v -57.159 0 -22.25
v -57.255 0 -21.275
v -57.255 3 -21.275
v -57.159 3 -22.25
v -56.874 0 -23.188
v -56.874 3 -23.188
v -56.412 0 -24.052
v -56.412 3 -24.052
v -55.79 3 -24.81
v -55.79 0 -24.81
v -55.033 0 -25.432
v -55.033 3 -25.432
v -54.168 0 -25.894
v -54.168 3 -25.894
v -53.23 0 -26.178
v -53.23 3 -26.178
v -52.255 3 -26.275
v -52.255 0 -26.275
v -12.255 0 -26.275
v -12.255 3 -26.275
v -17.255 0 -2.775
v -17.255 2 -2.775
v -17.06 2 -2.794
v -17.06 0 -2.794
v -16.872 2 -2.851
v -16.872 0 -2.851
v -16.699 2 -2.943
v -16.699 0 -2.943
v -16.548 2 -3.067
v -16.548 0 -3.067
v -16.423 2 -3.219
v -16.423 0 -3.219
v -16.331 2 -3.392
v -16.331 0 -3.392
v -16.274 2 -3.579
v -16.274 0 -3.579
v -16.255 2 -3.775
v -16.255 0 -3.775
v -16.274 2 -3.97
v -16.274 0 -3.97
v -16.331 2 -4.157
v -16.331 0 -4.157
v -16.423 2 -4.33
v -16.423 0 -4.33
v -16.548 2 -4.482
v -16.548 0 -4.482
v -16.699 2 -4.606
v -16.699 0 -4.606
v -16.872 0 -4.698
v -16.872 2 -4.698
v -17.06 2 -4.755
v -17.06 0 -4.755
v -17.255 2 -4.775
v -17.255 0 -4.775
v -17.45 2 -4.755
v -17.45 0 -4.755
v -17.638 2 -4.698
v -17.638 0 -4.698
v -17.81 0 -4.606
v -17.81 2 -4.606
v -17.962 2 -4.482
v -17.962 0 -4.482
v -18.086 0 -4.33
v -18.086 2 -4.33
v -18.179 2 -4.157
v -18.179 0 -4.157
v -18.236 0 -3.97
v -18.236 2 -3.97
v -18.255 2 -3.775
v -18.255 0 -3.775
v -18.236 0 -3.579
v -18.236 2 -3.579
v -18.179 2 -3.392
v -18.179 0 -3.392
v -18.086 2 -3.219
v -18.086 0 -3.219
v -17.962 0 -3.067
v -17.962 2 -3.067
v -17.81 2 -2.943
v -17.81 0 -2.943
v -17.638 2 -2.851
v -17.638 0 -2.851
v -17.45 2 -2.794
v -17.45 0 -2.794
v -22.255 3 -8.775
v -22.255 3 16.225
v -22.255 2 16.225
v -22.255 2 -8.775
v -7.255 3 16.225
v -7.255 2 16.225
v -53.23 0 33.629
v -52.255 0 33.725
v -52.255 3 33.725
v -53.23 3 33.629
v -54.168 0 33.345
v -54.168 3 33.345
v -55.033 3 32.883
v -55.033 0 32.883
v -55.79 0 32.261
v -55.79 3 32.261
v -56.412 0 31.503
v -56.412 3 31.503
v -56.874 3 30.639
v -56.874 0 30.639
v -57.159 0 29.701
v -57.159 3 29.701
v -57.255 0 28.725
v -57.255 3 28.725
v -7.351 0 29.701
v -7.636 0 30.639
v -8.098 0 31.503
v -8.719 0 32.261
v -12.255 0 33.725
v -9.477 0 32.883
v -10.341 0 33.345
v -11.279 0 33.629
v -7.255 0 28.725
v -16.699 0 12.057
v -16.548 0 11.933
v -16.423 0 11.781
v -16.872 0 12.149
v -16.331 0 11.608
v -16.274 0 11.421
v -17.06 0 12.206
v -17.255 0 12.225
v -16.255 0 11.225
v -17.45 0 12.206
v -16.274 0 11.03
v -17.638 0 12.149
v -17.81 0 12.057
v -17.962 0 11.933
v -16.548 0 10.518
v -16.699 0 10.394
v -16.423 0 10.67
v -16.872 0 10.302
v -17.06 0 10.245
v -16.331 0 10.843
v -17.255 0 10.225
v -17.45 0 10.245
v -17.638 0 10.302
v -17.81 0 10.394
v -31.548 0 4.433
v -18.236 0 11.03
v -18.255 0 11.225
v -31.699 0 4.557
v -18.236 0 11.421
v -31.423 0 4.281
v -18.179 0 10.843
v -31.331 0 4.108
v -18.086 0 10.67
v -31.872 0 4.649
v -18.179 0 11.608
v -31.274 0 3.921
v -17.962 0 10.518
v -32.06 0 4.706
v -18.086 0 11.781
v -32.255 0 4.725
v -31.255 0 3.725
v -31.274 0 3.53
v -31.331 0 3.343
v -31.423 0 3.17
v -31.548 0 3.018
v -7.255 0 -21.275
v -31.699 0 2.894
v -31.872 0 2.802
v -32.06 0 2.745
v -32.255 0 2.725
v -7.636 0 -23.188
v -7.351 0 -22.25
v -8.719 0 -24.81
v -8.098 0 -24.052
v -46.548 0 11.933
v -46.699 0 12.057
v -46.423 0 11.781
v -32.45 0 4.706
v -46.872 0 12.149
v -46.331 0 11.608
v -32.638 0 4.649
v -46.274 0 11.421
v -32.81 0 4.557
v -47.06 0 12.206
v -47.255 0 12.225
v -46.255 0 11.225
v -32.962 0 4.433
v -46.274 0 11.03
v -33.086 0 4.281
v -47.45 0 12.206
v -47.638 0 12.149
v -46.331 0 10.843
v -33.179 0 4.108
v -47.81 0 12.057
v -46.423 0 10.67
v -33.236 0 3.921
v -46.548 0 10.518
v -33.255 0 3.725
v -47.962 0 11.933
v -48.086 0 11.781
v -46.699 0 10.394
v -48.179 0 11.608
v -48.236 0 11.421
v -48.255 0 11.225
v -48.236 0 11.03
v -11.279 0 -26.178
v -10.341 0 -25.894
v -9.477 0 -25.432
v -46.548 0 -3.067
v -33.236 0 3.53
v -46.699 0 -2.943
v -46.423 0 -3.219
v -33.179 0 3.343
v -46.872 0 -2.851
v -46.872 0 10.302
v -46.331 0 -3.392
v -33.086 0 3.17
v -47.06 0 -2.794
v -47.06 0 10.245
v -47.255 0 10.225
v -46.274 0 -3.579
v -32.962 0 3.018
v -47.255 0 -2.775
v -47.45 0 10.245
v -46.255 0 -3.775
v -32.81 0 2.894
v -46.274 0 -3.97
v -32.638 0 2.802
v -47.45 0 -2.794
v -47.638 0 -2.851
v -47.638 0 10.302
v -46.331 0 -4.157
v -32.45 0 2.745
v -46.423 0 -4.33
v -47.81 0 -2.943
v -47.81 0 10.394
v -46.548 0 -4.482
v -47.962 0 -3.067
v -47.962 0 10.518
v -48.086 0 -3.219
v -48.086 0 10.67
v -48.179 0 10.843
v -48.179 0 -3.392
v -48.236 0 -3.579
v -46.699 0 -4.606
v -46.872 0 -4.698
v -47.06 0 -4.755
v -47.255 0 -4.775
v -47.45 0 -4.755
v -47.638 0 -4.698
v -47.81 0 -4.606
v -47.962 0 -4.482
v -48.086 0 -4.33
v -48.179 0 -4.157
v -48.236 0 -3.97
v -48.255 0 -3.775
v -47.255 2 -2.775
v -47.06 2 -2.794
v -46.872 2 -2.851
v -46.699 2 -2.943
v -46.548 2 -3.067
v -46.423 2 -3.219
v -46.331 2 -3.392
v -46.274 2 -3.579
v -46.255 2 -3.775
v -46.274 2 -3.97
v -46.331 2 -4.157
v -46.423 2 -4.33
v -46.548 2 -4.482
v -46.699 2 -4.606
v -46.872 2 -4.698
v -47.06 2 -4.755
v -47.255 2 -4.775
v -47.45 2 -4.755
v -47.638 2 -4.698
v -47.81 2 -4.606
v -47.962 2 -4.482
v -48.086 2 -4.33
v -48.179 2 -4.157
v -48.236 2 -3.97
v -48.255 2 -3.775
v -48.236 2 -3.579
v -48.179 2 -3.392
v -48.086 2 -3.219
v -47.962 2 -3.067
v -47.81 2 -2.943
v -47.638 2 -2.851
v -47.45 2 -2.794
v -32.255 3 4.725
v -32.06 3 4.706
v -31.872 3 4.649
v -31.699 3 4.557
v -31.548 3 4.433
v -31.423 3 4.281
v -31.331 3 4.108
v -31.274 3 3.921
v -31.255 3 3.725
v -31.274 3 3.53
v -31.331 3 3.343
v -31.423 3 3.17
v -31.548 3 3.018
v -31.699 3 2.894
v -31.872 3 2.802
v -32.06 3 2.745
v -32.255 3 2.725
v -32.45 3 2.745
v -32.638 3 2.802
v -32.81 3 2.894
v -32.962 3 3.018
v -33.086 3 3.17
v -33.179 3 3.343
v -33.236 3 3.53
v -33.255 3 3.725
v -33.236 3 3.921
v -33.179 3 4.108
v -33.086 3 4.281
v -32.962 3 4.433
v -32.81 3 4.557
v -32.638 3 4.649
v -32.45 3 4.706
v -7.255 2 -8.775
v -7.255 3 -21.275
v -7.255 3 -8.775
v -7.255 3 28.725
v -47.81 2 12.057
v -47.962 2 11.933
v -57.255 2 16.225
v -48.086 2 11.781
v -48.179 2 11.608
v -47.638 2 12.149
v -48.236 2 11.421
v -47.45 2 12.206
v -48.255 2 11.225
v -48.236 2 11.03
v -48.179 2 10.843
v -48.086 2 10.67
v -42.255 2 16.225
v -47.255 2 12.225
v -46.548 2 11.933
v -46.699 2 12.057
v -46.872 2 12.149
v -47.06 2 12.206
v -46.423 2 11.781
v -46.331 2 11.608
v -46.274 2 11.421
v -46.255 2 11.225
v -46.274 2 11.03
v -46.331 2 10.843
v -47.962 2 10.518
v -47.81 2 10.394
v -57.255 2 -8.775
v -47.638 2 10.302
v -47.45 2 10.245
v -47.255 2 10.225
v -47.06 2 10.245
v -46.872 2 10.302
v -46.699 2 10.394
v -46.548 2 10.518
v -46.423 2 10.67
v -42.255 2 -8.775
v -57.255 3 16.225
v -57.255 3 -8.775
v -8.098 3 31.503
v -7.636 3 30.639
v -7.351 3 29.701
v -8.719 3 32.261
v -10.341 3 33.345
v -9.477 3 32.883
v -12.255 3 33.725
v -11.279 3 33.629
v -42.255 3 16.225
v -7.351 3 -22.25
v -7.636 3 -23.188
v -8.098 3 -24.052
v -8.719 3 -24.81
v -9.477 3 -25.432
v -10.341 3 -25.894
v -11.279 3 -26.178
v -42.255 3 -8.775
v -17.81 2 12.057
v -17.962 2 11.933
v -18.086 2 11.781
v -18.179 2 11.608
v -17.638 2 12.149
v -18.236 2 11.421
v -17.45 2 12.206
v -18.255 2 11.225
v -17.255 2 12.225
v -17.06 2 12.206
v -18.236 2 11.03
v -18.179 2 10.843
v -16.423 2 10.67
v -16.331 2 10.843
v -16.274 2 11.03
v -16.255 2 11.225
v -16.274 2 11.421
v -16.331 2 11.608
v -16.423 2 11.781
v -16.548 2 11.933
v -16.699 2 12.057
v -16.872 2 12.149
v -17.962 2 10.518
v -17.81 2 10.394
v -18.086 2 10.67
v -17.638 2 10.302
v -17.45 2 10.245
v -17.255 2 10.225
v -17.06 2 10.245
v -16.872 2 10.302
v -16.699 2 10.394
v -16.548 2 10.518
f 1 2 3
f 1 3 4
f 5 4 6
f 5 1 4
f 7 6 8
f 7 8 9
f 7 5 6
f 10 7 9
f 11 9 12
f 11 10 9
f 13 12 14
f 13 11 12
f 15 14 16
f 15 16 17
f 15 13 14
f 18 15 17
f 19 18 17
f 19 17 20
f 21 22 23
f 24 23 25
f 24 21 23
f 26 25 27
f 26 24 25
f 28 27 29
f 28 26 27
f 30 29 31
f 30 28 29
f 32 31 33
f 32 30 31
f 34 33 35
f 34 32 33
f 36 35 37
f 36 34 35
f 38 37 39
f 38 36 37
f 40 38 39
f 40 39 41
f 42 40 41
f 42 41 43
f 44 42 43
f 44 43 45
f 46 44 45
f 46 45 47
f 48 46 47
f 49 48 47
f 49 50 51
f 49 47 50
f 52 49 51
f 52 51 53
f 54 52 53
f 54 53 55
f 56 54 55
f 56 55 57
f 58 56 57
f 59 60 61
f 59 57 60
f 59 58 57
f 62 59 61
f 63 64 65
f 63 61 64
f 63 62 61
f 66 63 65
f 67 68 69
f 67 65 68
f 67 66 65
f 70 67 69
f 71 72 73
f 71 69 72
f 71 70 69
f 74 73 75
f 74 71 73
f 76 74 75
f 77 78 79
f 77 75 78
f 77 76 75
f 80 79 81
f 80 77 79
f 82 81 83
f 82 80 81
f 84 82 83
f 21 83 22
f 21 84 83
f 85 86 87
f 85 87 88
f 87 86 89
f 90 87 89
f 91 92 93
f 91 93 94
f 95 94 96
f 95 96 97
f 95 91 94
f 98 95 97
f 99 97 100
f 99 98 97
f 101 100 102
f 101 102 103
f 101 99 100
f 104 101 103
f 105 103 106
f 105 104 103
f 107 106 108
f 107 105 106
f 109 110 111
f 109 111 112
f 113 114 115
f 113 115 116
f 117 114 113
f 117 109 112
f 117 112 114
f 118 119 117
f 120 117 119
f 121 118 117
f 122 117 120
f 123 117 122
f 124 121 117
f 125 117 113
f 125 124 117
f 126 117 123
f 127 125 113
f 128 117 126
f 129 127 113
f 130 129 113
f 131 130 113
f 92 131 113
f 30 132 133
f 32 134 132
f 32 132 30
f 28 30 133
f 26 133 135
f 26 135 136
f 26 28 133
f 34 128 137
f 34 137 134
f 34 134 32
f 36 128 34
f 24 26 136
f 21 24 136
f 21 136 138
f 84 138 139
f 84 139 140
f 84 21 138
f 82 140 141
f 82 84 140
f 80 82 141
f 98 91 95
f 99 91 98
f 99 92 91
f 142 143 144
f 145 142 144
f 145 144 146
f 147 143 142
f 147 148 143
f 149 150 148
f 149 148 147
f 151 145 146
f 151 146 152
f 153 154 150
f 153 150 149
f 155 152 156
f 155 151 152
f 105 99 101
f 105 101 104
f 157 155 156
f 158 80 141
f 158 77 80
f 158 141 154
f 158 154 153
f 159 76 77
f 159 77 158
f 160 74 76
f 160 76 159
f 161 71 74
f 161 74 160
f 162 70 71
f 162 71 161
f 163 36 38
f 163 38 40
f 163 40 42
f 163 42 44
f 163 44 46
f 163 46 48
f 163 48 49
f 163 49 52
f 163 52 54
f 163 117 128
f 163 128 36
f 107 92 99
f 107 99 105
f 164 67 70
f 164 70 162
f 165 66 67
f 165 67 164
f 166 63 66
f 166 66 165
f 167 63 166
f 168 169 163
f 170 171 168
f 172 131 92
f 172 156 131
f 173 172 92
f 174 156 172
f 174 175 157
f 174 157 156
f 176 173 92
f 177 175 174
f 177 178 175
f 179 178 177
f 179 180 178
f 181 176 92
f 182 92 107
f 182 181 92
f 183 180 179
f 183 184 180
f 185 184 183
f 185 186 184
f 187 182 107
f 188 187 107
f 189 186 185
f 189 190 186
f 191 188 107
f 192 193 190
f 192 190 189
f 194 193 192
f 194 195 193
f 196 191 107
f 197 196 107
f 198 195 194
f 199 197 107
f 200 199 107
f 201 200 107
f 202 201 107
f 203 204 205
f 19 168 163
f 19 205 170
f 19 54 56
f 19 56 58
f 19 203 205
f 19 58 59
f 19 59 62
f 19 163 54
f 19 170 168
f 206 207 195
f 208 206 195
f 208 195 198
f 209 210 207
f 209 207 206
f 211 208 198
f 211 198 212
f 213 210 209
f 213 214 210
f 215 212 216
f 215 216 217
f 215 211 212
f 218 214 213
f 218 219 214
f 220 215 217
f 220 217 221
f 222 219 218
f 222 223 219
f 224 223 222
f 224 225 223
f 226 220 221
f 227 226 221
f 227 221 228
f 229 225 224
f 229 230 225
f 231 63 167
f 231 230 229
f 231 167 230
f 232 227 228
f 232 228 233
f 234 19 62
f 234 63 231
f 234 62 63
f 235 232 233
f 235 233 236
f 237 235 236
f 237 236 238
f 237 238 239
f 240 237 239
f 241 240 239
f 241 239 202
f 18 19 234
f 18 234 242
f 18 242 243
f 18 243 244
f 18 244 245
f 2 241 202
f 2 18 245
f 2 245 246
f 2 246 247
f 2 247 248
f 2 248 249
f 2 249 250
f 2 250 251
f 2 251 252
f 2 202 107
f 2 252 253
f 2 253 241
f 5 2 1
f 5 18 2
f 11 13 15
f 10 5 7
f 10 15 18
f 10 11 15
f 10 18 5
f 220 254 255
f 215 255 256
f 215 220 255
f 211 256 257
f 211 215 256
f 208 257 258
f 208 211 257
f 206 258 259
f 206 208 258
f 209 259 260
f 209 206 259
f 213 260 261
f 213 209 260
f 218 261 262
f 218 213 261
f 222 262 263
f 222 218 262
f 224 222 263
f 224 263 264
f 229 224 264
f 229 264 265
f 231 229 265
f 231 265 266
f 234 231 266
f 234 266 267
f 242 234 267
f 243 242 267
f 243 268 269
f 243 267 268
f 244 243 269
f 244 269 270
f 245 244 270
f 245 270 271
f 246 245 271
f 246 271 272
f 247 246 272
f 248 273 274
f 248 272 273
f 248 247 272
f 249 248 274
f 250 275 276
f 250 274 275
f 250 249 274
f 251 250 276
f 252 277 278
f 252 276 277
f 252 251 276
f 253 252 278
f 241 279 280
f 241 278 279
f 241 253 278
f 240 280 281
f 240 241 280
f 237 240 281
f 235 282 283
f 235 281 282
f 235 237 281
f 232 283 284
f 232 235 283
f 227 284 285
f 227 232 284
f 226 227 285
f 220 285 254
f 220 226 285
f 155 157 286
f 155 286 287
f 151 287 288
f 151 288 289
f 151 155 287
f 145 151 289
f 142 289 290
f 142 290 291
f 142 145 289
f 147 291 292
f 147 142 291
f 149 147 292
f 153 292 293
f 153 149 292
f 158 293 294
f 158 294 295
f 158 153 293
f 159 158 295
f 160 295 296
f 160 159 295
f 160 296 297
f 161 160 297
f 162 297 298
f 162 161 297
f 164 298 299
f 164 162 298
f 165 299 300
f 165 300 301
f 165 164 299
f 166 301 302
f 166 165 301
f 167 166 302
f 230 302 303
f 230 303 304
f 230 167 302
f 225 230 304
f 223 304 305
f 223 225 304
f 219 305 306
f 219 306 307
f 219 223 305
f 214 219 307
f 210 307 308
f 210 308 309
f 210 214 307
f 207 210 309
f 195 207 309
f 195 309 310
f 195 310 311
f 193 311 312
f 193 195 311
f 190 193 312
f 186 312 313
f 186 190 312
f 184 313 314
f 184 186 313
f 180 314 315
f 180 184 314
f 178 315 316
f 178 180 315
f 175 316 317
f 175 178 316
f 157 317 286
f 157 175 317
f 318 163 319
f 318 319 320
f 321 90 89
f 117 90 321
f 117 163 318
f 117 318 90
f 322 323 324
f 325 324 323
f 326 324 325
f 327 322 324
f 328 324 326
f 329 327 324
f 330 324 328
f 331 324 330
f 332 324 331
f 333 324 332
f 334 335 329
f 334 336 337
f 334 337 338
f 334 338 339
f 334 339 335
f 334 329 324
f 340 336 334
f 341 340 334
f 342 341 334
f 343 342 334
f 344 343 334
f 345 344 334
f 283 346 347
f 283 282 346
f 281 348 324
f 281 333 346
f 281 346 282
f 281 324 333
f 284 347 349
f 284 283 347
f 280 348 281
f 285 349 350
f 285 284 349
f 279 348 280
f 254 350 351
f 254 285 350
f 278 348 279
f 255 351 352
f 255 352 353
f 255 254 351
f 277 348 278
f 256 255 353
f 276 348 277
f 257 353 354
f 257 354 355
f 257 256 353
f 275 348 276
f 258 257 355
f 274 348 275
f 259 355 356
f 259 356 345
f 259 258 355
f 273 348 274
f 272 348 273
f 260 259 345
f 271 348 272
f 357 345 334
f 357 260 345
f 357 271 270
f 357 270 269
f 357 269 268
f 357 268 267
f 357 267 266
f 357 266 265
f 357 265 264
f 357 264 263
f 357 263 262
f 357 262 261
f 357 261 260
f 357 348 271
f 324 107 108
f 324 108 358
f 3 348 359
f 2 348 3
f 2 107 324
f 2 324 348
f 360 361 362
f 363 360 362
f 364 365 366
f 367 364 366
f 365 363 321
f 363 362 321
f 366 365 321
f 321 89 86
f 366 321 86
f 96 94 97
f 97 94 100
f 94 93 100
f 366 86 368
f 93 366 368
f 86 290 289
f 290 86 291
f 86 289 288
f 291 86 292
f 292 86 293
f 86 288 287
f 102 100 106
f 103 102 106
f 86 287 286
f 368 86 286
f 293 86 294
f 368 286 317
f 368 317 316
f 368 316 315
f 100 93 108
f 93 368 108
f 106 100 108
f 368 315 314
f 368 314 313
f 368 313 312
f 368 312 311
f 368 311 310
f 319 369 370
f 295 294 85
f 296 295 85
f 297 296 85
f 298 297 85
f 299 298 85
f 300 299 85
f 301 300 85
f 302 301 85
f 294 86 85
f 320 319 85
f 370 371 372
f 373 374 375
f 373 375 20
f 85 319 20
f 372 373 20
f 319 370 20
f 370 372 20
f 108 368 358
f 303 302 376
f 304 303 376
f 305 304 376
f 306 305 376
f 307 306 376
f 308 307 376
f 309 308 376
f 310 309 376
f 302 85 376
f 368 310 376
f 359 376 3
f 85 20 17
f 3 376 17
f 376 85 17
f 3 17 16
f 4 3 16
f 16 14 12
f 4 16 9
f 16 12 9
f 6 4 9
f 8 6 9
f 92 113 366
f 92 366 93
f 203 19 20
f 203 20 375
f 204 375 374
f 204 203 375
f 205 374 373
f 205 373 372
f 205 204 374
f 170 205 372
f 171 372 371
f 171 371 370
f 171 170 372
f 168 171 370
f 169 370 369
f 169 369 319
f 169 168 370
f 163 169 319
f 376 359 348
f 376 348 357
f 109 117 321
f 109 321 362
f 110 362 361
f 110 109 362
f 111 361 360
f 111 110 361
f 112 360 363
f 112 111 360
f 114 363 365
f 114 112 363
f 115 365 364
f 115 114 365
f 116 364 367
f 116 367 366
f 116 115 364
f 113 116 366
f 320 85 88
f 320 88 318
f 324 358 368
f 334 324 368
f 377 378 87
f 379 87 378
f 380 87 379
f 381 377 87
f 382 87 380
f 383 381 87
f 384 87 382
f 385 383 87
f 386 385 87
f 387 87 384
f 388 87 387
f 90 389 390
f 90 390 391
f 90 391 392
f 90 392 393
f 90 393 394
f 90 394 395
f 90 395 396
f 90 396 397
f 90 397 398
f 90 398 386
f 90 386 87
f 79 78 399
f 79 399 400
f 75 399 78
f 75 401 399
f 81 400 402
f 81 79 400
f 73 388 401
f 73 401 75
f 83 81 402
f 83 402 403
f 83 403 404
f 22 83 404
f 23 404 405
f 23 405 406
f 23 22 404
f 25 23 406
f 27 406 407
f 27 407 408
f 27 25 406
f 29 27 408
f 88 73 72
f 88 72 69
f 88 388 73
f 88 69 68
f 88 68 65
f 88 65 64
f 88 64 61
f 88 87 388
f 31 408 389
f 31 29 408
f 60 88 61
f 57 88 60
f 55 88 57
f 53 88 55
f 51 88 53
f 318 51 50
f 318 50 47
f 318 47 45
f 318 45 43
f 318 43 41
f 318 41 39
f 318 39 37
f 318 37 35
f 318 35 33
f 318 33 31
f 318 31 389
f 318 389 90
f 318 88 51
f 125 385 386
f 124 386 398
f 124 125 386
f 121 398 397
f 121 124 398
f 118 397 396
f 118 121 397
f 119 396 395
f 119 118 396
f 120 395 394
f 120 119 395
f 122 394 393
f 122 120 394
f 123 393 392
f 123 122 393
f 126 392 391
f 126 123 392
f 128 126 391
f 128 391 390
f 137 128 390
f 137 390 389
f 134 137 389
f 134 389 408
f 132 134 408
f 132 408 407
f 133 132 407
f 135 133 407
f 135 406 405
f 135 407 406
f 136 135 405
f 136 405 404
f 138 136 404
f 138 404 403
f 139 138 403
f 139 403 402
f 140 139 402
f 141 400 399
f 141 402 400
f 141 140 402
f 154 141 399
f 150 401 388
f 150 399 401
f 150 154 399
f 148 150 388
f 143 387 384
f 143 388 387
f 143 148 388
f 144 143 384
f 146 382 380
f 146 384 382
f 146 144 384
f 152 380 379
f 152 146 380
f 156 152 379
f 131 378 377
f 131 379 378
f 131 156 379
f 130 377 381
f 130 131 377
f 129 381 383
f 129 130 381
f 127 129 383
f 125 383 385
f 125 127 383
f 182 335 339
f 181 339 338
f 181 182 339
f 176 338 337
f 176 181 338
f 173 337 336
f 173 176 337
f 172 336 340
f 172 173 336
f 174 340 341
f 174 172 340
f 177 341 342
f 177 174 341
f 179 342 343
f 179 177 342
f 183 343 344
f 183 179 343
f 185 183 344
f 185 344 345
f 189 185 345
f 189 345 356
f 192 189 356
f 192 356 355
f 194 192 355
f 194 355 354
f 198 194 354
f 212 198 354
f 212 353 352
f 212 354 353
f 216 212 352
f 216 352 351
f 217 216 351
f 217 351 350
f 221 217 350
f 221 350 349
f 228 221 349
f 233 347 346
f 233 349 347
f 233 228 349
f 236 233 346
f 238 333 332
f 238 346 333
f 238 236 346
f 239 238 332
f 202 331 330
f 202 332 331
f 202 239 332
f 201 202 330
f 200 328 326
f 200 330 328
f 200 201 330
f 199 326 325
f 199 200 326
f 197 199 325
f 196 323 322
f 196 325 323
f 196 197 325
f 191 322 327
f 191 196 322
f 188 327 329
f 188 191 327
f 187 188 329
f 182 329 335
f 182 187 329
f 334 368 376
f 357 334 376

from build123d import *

# Parameters (mm, degrees)
SKETCH1_R           = 1
BOSS_EXTRUDE1_DEPTH = 3
SKETCH2_W           = 15
SKETCH2_H           = 25
CUT_EXTRUDE1_DEPTH  = 1
SKETCH3_W           = 15
SKETCH3_H           = 25
CUT_EXTRUDE2_DEPTH  = 1


with BuildPart() as part:
    # Sketch1 → Boss-Extrude1 (new body)
    with BuildSketch(Plane(origin=(0, 0, 0), x_dir=(1, 0, 0), z_dir=(0, 1, 0))):
        with BuildLine():
            Line((-52.254901961, 26.274509804), (-12.254901961, 26.274509804))
            ThreePointArc((-12.254901961, 26.274509804), (-8.719368055, 24.81004371), (-7.254901961, 21.274509804))
            Line((-7.254901961, 21.274509804), (-7.254901961, -28.725490196))
            ThreePointArc((-7.254901961, -28.725490196), (-8.719368055, -32.261024102), (-12.254901961, -33.725490196))
            Line((-12.254901961, -33.725490196), (-52.254901961, -33.725490196))
            ThreePointArc((-52.254901961, -33.725490196), (-55.790435867, -32.261024102), (-57.254901961, -28.725490196))
            Line((-57.254901961, -28.725490196), (-57.254901961, 21.274509804))
            ThreePointArc((-57.254901961, 21.274509804), (-55.790435867, 24.81004371), (-52.254901961, 26.274509804))
        make_face()
        with Locations(Location((-32.254901961, -3.725490196, 0), (0, 0, 270))):
            Circle(SKETCH1_R, mode=Mode.SUBTRACT)
        with Locations(Location((-47.254901961, 3.774509804, 0), (0, 0, 270))):
            Circle(SKETCH1_R, mode=Mode.SUBTRACT)
        with Locations(Location((-47.254901961, -11.225490196, 0), (0, 0, 270))):
            Circle(SKETCH1_R, mode=Mode.SUBTRACT)
        with Locations(Location((-17.254901961, 3.774509804, 0), (0, 0, 270))):
            Circle(SKETCH1_R, mode=Mode.SUBTRACT)
        with Locations(Location((-17.254901961, -11.225490196, 0), (0, 0, 270))):
            Circle(SKETCH1_R, mode=Mode.SUBTRACT)
    extrude(amount=BOSS_EXTRUDE1_DEPTH)

    # Sketch2 → Cut-Extrude1 (cut)
    with BuildSketch(Plane(origin=(0, 3, 0), x_dir=(1, 0, 0), z_dir=(0, 1, 0))):
        with Locations((-49.754901961, -3.725490196)):
            Rectangle(SKETCH2_W, SKETCH2_H)
    extrude(amount=-CUT_EXTRUDE1_DEPTH, mode=Mode.SUBTRACT)

    # Sketch3 → Cut-Extrude2 (cut)
    with BuildSketch(Plane(origin=(0, 3, 0), x_dir=(1, 0, 0), z_dir=(0, 1, 0))):
        with Locations((-14.754901961, -3.725490196)):
            Rectangle(SKETCH3_W, SKETCH3_H)
    extrude(amount=-CUT_EXTRUDE2_DEPTH, mode=Mode.SUBTRACT)


solid = part.part
